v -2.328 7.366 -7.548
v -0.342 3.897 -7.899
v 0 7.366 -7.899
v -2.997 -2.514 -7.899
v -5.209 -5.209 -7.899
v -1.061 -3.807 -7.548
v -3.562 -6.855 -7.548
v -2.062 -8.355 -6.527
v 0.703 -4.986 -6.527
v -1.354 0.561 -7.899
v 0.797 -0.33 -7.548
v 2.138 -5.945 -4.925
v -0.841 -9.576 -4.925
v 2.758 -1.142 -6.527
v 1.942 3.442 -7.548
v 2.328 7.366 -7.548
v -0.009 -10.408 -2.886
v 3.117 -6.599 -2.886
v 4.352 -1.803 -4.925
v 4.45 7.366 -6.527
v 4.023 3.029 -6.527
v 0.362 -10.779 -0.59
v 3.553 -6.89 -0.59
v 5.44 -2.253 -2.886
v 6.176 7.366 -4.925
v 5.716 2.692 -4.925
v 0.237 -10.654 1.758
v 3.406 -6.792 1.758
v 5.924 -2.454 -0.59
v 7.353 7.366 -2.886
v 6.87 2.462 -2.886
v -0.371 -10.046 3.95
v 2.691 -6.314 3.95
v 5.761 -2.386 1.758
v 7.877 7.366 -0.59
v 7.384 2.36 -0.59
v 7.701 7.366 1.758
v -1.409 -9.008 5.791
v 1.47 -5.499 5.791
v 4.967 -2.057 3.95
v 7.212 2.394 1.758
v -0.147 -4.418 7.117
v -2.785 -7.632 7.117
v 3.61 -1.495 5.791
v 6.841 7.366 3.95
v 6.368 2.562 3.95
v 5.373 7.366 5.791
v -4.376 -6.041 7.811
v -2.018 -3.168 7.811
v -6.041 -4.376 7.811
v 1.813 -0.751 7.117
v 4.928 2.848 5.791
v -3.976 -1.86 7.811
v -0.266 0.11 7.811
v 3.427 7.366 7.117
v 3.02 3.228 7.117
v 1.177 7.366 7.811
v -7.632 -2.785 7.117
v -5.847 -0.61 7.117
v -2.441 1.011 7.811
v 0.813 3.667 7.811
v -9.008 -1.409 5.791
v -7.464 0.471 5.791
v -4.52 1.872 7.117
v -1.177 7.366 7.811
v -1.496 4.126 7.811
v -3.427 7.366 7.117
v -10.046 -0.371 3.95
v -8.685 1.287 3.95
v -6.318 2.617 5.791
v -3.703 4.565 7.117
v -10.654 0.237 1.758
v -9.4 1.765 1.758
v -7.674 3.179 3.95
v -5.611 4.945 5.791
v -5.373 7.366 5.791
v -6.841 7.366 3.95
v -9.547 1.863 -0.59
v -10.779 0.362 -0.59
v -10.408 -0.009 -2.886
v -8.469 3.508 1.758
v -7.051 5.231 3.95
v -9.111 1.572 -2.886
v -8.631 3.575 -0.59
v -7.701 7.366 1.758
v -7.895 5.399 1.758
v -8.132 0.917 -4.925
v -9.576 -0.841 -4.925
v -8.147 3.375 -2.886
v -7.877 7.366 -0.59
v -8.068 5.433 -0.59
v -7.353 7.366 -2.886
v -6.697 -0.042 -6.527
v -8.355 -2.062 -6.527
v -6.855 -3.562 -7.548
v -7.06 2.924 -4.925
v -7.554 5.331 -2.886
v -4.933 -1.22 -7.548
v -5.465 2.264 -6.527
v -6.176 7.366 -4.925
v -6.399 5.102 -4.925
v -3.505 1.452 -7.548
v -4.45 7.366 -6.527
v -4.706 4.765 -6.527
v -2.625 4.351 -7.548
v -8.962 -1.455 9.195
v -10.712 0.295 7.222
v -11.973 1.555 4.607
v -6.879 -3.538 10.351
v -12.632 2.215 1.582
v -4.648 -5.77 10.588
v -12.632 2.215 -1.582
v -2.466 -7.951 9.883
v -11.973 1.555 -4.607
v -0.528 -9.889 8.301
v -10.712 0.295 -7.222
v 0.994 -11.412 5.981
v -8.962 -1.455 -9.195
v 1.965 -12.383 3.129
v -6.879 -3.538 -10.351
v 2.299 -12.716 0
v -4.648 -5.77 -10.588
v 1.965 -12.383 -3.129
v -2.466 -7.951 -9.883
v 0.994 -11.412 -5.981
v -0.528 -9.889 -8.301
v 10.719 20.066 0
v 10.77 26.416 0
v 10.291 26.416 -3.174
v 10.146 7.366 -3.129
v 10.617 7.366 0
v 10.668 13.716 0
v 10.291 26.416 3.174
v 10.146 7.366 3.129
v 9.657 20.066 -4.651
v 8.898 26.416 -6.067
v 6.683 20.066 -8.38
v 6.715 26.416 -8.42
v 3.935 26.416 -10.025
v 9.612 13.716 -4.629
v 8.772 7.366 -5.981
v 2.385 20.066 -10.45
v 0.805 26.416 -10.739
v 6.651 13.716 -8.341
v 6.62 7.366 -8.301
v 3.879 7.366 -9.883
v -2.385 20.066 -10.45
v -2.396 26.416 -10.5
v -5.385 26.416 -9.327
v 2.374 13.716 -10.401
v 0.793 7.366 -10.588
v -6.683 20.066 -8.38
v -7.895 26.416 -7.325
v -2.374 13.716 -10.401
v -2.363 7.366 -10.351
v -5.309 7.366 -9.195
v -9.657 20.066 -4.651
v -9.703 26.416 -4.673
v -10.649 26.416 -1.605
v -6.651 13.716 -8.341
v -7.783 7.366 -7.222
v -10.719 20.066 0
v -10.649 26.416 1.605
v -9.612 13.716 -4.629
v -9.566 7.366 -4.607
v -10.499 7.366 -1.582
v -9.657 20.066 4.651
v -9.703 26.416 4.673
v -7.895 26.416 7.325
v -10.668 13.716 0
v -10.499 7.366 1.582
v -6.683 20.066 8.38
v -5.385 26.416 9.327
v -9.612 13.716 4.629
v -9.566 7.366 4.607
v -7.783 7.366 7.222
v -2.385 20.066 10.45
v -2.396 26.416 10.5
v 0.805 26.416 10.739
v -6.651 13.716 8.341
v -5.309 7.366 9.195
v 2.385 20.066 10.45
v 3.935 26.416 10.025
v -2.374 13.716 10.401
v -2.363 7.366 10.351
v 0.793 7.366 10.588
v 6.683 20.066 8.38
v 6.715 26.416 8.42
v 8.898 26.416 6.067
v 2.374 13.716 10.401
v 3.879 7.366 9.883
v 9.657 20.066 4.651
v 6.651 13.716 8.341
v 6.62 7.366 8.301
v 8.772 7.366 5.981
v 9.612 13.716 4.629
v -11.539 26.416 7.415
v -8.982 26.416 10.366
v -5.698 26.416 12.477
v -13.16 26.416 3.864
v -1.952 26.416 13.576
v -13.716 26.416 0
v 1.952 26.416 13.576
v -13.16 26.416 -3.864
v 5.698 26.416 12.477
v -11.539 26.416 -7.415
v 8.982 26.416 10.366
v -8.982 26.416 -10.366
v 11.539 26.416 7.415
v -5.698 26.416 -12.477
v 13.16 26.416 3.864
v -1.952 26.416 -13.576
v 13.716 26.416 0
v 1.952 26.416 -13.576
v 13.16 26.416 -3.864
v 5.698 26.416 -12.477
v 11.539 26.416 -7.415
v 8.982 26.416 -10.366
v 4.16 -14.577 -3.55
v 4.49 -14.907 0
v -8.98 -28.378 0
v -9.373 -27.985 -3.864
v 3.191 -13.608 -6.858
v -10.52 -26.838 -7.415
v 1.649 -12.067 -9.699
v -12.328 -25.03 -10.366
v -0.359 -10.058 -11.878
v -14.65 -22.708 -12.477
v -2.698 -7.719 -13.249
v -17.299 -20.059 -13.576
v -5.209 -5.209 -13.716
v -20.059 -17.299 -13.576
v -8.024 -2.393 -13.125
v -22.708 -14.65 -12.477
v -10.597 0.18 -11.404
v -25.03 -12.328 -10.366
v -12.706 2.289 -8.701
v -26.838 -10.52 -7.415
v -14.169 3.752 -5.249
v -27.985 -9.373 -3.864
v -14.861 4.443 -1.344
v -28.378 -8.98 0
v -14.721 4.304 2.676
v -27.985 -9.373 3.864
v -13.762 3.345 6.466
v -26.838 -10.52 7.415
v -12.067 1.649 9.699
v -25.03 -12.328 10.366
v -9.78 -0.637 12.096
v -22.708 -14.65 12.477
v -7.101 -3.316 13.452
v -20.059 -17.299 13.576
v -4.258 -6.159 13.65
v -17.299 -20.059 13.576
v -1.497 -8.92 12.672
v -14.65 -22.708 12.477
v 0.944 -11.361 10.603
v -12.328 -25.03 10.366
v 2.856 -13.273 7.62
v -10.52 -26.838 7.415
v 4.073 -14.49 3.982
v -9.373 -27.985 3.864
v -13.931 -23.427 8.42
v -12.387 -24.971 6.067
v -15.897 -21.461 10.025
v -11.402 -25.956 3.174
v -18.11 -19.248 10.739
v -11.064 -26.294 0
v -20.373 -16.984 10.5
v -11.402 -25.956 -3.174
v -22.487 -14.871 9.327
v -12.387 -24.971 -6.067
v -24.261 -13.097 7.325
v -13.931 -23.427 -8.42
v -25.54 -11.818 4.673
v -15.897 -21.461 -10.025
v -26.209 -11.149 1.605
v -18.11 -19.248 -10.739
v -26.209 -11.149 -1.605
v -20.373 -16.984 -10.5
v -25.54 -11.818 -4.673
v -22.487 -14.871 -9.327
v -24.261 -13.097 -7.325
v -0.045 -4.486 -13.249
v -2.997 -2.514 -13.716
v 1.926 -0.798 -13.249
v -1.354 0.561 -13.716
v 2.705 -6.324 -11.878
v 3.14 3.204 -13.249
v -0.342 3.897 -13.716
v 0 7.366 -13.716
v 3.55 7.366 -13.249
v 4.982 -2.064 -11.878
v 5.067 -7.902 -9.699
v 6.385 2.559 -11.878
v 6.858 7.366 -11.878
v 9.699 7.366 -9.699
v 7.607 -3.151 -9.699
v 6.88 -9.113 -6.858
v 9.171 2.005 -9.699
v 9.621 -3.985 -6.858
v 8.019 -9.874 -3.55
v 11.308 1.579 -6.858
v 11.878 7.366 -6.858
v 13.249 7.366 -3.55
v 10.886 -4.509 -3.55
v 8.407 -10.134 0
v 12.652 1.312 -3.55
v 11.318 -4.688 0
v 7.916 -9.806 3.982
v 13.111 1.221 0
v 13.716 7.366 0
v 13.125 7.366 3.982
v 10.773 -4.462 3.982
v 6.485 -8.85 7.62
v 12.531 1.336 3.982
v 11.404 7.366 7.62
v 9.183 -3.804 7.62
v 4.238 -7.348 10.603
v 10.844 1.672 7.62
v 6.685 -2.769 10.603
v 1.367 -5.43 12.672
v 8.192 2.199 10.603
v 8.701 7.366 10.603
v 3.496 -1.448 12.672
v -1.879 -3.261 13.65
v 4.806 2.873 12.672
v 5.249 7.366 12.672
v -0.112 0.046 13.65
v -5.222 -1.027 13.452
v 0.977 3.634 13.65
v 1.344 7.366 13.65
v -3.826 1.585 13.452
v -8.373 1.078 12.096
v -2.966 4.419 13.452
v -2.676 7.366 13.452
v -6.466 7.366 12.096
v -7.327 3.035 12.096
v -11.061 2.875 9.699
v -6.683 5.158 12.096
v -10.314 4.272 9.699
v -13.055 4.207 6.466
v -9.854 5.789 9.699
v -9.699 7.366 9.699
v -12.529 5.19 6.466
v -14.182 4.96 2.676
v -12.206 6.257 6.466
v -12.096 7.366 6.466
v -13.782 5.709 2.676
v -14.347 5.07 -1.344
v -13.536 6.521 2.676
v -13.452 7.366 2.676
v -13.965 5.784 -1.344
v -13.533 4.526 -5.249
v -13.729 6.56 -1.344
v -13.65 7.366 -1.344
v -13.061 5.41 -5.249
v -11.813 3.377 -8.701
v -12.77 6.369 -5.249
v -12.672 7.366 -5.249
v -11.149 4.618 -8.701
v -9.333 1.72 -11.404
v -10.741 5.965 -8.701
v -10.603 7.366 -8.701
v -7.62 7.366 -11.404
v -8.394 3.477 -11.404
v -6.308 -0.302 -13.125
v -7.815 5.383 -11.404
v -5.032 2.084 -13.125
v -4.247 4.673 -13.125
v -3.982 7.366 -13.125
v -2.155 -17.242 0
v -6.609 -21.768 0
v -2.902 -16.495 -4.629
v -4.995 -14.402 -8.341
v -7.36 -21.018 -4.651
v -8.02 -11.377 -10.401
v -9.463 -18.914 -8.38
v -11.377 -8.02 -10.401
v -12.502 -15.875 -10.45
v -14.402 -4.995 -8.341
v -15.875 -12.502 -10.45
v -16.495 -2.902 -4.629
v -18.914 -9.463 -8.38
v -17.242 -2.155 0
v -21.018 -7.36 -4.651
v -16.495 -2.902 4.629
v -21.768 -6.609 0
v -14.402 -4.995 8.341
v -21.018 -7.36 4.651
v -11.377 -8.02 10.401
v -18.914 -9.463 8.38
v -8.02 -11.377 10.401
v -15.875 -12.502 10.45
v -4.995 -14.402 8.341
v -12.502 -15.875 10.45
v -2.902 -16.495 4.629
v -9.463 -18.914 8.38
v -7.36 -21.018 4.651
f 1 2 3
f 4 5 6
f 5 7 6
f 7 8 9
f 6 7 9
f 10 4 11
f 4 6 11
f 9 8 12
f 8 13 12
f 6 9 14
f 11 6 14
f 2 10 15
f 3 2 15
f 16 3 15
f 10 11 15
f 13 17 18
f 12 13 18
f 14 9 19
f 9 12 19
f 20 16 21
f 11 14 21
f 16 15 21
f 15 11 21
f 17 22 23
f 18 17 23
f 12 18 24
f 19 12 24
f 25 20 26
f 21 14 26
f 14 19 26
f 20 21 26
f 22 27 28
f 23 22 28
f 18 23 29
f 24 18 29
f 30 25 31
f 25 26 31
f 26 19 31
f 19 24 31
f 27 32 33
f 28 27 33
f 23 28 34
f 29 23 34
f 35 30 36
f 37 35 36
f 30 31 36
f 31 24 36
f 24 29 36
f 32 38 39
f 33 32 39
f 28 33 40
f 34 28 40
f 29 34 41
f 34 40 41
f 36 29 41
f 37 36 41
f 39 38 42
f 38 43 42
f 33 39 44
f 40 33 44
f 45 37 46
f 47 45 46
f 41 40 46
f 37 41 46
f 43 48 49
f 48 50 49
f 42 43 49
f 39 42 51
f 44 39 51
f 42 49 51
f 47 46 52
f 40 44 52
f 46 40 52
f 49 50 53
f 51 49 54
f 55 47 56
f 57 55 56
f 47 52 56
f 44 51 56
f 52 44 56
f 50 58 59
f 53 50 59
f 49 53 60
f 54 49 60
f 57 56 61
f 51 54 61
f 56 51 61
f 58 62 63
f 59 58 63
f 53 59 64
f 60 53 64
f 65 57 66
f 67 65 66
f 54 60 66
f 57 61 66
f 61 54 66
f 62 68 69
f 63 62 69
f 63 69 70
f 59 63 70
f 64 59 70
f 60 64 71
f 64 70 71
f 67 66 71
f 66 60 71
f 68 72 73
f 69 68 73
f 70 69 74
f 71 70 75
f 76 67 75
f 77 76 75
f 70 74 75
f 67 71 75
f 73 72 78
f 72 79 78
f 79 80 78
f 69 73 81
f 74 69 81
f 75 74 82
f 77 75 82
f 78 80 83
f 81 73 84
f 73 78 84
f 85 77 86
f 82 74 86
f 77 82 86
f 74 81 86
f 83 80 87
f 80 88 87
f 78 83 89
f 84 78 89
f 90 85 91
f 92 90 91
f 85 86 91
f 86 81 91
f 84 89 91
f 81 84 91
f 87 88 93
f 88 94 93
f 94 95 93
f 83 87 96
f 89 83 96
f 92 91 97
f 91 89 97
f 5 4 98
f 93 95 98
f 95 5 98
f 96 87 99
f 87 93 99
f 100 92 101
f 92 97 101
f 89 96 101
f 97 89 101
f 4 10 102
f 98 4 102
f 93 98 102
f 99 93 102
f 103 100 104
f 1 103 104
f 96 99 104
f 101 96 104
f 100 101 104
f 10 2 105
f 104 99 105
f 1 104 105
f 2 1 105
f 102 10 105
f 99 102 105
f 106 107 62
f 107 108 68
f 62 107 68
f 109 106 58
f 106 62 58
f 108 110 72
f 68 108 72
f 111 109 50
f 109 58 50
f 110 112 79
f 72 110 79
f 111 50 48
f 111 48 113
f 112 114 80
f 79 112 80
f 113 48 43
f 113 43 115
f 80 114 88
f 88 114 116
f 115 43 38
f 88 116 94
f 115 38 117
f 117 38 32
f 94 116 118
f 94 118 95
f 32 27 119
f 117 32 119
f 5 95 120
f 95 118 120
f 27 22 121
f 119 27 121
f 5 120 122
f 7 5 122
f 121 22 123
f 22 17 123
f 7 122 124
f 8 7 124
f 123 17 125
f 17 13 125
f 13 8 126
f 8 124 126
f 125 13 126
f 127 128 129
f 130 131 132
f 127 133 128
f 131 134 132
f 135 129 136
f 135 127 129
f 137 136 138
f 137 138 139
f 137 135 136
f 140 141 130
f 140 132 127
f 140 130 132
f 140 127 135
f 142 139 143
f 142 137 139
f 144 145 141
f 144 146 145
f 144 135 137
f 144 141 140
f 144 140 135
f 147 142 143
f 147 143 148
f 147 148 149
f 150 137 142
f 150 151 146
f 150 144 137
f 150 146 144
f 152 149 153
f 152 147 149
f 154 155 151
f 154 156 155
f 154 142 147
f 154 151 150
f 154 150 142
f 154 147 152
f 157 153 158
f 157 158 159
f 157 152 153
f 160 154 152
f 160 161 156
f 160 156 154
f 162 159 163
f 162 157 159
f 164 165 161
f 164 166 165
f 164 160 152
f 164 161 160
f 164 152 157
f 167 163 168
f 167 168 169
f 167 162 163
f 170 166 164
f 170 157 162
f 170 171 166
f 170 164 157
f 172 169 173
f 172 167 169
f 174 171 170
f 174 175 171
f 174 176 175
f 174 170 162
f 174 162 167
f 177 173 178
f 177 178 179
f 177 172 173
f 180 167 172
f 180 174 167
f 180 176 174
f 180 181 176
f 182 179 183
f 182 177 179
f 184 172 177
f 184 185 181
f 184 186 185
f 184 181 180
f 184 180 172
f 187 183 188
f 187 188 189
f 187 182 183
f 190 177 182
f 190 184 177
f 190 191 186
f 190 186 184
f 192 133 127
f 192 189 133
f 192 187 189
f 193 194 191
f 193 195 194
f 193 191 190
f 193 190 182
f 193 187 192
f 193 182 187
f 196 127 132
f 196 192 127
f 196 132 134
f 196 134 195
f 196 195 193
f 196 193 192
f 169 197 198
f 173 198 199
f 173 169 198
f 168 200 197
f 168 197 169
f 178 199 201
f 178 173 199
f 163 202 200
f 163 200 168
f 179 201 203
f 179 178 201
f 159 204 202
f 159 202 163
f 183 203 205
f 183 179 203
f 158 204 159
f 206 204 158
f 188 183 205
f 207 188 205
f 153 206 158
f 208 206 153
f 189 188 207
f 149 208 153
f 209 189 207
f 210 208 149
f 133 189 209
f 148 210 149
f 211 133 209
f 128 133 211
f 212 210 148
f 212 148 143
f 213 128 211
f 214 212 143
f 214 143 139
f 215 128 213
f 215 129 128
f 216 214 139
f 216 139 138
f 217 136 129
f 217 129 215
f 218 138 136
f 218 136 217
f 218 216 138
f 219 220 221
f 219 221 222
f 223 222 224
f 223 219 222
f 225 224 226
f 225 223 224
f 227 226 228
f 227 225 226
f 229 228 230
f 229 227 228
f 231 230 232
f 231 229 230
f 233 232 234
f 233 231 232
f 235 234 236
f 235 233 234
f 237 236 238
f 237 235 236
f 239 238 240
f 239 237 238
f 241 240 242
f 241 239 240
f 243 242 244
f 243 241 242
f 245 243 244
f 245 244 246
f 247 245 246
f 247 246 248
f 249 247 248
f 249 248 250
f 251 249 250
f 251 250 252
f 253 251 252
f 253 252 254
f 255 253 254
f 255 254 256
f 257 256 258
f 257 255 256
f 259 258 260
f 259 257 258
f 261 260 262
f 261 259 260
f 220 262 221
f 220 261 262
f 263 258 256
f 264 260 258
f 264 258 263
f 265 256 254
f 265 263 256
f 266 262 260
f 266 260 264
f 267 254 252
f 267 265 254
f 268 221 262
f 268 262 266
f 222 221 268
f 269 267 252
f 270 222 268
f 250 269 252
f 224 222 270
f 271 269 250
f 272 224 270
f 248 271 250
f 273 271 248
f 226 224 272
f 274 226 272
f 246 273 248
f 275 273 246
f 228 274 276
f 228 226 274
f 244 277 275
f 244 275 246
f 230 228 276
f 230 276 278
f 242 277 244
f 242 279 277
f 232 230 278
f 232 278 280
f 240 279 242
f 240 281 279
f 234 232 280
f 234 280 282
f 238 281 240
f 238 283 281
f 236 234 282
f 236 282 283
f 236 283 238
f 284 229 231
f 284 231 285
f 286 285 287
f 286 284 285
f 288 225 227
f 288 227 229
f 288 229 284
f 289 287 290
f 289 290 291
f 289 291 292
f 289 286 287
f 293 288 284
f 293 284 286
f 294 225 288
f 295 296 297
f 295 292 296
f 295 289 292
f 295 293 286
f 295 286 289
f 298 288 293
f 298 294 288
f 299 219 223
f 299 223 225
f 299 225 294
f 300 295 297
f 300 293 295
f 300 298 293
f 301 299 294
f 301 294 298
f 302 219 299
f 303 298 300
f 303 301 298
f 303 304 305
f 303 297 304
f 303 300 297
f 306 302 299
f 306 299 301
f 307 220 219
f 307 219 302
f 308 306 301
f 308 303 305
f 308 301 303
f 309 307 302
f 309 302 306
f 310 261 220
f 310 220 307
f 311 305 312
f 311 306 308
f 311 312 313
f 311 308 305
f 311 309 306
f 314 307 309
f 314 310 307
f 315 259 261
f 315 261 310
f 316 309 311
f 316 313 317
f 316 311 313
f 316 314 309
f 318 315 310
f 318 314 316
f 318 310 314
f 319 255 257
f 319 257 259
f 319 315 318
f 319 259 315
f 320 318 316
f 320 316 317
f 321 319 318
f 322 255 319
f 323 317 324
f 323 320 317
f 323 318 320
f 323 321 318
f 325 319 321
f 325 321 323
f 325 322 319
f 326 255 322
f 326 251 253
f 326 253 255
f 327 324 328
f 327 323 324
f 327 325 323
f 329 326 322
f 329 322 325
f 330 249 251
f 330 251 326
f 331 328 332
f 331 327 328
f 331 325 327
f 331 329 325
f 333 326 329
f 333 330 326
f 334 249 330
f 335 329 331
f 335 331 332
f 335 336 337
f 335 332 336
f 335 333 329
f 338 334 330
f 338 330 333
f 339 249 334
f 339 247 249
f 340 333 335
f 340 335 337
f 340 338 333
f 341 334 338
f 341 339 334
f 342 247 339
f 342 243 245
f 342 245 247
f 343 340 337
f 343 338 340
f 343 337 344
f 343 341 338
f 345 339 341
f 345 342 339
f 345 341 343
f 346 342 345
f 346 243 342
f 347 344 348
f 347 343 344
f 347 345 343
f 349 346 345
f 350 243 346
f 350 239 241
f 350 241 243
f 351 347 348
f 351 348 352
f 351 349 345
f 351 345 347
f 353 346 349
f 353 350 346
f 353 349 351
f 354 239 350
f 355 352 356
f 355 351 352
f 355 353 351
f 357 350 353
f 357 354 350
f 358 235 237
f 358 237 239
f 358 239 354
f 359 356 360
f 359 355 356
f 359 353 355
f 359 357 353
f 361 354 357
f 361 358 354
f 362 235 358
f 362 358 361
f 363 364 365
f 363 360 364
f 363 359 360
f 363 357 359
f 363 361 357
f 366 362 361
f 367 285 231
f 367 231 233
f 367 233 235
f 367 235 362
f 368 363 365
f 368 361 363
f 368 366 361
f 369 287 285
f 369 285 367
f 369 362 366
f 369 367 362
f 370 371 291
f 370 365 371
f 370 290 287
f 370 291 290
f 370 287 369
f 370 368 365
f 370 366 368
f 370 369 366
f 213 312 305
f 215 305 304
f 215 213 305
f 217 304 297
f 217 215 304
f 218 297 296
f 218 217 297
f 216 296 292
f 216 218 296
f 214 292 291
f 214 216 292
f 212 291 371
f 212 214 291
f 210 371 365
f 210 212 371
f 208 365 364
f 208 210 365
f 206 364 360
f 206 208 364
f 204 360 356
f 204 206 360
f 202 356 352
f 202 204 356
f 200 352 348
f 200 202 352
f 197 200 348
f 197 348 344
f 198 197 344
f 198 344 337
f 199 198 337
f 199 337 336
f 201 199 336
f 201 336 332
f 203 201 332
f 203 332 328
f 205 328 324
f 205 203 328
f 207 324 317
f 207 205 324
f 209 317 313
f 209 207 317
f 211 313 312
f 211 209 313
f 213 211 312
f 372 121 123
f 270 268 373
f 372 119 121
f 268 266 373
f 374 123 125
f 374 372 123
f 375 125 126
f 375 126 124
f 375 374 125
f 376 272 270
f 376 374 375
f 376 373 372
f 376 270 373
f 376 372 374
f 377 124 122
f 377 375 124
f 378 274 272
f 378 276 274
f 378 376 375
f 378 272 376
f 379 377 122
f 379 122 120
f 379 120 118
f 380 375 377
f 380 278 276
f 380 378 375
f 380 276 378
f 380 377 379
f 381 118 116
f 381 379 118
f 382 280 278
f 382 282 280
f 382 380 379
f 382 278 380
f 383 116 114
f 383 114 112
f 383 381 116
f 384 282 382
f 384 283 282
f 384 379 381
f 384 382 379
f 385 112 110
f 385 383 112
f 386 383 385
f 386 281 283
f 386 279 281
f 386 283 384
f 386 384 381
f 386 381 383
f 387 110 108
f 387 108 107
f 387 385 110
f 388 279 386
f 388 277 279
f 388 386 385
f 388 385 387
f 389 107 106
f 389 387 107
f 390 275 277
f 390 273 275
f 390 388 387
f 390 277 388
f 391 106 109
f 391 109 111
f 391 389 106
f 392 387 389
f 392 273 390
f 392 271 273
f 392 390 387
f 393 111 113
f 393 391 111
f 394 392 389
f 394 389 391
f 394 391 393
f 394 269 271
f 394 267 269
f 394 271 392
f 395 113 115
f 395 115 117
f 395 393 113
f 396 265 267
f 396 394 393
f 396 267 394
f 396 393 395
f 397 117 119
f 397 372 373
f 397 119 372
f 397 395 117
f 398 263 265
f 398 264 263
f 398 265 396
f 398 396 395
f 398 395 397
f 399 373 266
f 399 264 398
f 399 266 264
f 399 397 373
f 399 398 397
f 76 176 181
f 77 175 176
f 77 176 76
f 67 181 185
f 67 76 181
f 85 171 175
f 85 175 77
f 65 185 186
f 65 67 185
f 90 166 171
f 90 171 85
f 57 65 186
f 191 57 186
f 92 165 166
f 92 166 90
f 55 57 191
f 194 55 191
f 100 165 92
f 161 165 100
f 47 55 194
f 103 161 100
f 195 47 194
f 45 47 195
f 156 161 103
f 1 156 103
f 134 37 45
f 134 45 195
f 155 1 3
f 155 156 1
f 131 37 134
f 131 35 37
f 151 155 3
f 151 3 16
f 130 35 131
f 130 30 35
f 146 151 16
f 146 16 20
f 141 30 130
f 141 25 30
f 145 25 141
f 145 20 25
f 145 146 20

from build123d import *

# Parameters (mm, degrees)
SKETCH3_R   = 13.716
SKETCH3_R_2 = 7.8994


with BuildPart() as part:
    # Sketch1 → Revolve1 (revolve)
    with BuildSketch(Plane.XY):
        Polygon((-8.980256121, -28.377609343), (4.490128061, -14.907225161), (2.298945567, -12.716042667), (-11.063675541, -26.294189922), align=None)
    revolve(axis=Axis((-18.678932732, -18.678932732, 0), (0.707106781, 0.707106781, 0)))



with BuildPart() as body_2:
    # Sketch2 → Revolve2 (revolve)
    with BuildSketch(Plane.XY):
        Polygon((10.7696, 26.416), (10.6172, 7.366), (13.716, 7.366), (13.716, 26.416), align=None)
    revolve(axis=Axis((0, 0, 0), (0, 1, 0)))


with BuildPart() as part_1:
    add(part.part)

    add(body_2.part)  # Sweep1 merges body 2
    # Sweep1: sweep along a path in Sketch4
    with BuildLine(Plane.XY) as sweep1_path:
        ThreePointArc((-5.20854855, -5.20854855), (-1.353657665, 0.560703364), (0, 7.366))
    # Sketch3 → Sweep1 (sweep)
    with BuildSketch(Plane(origin=(-5.20854855, -5.20854855, 0), x_dir=(0, 0, -1), z_dir=(0.707106781, 0.707106781, 0))):
        Circle(SKETCH3_R)
        Circle(SKETCH3_R_2, mode=Mode.SUBTRACT)
    sweep(path=sweep1_path.line)


solid = part_1.part
